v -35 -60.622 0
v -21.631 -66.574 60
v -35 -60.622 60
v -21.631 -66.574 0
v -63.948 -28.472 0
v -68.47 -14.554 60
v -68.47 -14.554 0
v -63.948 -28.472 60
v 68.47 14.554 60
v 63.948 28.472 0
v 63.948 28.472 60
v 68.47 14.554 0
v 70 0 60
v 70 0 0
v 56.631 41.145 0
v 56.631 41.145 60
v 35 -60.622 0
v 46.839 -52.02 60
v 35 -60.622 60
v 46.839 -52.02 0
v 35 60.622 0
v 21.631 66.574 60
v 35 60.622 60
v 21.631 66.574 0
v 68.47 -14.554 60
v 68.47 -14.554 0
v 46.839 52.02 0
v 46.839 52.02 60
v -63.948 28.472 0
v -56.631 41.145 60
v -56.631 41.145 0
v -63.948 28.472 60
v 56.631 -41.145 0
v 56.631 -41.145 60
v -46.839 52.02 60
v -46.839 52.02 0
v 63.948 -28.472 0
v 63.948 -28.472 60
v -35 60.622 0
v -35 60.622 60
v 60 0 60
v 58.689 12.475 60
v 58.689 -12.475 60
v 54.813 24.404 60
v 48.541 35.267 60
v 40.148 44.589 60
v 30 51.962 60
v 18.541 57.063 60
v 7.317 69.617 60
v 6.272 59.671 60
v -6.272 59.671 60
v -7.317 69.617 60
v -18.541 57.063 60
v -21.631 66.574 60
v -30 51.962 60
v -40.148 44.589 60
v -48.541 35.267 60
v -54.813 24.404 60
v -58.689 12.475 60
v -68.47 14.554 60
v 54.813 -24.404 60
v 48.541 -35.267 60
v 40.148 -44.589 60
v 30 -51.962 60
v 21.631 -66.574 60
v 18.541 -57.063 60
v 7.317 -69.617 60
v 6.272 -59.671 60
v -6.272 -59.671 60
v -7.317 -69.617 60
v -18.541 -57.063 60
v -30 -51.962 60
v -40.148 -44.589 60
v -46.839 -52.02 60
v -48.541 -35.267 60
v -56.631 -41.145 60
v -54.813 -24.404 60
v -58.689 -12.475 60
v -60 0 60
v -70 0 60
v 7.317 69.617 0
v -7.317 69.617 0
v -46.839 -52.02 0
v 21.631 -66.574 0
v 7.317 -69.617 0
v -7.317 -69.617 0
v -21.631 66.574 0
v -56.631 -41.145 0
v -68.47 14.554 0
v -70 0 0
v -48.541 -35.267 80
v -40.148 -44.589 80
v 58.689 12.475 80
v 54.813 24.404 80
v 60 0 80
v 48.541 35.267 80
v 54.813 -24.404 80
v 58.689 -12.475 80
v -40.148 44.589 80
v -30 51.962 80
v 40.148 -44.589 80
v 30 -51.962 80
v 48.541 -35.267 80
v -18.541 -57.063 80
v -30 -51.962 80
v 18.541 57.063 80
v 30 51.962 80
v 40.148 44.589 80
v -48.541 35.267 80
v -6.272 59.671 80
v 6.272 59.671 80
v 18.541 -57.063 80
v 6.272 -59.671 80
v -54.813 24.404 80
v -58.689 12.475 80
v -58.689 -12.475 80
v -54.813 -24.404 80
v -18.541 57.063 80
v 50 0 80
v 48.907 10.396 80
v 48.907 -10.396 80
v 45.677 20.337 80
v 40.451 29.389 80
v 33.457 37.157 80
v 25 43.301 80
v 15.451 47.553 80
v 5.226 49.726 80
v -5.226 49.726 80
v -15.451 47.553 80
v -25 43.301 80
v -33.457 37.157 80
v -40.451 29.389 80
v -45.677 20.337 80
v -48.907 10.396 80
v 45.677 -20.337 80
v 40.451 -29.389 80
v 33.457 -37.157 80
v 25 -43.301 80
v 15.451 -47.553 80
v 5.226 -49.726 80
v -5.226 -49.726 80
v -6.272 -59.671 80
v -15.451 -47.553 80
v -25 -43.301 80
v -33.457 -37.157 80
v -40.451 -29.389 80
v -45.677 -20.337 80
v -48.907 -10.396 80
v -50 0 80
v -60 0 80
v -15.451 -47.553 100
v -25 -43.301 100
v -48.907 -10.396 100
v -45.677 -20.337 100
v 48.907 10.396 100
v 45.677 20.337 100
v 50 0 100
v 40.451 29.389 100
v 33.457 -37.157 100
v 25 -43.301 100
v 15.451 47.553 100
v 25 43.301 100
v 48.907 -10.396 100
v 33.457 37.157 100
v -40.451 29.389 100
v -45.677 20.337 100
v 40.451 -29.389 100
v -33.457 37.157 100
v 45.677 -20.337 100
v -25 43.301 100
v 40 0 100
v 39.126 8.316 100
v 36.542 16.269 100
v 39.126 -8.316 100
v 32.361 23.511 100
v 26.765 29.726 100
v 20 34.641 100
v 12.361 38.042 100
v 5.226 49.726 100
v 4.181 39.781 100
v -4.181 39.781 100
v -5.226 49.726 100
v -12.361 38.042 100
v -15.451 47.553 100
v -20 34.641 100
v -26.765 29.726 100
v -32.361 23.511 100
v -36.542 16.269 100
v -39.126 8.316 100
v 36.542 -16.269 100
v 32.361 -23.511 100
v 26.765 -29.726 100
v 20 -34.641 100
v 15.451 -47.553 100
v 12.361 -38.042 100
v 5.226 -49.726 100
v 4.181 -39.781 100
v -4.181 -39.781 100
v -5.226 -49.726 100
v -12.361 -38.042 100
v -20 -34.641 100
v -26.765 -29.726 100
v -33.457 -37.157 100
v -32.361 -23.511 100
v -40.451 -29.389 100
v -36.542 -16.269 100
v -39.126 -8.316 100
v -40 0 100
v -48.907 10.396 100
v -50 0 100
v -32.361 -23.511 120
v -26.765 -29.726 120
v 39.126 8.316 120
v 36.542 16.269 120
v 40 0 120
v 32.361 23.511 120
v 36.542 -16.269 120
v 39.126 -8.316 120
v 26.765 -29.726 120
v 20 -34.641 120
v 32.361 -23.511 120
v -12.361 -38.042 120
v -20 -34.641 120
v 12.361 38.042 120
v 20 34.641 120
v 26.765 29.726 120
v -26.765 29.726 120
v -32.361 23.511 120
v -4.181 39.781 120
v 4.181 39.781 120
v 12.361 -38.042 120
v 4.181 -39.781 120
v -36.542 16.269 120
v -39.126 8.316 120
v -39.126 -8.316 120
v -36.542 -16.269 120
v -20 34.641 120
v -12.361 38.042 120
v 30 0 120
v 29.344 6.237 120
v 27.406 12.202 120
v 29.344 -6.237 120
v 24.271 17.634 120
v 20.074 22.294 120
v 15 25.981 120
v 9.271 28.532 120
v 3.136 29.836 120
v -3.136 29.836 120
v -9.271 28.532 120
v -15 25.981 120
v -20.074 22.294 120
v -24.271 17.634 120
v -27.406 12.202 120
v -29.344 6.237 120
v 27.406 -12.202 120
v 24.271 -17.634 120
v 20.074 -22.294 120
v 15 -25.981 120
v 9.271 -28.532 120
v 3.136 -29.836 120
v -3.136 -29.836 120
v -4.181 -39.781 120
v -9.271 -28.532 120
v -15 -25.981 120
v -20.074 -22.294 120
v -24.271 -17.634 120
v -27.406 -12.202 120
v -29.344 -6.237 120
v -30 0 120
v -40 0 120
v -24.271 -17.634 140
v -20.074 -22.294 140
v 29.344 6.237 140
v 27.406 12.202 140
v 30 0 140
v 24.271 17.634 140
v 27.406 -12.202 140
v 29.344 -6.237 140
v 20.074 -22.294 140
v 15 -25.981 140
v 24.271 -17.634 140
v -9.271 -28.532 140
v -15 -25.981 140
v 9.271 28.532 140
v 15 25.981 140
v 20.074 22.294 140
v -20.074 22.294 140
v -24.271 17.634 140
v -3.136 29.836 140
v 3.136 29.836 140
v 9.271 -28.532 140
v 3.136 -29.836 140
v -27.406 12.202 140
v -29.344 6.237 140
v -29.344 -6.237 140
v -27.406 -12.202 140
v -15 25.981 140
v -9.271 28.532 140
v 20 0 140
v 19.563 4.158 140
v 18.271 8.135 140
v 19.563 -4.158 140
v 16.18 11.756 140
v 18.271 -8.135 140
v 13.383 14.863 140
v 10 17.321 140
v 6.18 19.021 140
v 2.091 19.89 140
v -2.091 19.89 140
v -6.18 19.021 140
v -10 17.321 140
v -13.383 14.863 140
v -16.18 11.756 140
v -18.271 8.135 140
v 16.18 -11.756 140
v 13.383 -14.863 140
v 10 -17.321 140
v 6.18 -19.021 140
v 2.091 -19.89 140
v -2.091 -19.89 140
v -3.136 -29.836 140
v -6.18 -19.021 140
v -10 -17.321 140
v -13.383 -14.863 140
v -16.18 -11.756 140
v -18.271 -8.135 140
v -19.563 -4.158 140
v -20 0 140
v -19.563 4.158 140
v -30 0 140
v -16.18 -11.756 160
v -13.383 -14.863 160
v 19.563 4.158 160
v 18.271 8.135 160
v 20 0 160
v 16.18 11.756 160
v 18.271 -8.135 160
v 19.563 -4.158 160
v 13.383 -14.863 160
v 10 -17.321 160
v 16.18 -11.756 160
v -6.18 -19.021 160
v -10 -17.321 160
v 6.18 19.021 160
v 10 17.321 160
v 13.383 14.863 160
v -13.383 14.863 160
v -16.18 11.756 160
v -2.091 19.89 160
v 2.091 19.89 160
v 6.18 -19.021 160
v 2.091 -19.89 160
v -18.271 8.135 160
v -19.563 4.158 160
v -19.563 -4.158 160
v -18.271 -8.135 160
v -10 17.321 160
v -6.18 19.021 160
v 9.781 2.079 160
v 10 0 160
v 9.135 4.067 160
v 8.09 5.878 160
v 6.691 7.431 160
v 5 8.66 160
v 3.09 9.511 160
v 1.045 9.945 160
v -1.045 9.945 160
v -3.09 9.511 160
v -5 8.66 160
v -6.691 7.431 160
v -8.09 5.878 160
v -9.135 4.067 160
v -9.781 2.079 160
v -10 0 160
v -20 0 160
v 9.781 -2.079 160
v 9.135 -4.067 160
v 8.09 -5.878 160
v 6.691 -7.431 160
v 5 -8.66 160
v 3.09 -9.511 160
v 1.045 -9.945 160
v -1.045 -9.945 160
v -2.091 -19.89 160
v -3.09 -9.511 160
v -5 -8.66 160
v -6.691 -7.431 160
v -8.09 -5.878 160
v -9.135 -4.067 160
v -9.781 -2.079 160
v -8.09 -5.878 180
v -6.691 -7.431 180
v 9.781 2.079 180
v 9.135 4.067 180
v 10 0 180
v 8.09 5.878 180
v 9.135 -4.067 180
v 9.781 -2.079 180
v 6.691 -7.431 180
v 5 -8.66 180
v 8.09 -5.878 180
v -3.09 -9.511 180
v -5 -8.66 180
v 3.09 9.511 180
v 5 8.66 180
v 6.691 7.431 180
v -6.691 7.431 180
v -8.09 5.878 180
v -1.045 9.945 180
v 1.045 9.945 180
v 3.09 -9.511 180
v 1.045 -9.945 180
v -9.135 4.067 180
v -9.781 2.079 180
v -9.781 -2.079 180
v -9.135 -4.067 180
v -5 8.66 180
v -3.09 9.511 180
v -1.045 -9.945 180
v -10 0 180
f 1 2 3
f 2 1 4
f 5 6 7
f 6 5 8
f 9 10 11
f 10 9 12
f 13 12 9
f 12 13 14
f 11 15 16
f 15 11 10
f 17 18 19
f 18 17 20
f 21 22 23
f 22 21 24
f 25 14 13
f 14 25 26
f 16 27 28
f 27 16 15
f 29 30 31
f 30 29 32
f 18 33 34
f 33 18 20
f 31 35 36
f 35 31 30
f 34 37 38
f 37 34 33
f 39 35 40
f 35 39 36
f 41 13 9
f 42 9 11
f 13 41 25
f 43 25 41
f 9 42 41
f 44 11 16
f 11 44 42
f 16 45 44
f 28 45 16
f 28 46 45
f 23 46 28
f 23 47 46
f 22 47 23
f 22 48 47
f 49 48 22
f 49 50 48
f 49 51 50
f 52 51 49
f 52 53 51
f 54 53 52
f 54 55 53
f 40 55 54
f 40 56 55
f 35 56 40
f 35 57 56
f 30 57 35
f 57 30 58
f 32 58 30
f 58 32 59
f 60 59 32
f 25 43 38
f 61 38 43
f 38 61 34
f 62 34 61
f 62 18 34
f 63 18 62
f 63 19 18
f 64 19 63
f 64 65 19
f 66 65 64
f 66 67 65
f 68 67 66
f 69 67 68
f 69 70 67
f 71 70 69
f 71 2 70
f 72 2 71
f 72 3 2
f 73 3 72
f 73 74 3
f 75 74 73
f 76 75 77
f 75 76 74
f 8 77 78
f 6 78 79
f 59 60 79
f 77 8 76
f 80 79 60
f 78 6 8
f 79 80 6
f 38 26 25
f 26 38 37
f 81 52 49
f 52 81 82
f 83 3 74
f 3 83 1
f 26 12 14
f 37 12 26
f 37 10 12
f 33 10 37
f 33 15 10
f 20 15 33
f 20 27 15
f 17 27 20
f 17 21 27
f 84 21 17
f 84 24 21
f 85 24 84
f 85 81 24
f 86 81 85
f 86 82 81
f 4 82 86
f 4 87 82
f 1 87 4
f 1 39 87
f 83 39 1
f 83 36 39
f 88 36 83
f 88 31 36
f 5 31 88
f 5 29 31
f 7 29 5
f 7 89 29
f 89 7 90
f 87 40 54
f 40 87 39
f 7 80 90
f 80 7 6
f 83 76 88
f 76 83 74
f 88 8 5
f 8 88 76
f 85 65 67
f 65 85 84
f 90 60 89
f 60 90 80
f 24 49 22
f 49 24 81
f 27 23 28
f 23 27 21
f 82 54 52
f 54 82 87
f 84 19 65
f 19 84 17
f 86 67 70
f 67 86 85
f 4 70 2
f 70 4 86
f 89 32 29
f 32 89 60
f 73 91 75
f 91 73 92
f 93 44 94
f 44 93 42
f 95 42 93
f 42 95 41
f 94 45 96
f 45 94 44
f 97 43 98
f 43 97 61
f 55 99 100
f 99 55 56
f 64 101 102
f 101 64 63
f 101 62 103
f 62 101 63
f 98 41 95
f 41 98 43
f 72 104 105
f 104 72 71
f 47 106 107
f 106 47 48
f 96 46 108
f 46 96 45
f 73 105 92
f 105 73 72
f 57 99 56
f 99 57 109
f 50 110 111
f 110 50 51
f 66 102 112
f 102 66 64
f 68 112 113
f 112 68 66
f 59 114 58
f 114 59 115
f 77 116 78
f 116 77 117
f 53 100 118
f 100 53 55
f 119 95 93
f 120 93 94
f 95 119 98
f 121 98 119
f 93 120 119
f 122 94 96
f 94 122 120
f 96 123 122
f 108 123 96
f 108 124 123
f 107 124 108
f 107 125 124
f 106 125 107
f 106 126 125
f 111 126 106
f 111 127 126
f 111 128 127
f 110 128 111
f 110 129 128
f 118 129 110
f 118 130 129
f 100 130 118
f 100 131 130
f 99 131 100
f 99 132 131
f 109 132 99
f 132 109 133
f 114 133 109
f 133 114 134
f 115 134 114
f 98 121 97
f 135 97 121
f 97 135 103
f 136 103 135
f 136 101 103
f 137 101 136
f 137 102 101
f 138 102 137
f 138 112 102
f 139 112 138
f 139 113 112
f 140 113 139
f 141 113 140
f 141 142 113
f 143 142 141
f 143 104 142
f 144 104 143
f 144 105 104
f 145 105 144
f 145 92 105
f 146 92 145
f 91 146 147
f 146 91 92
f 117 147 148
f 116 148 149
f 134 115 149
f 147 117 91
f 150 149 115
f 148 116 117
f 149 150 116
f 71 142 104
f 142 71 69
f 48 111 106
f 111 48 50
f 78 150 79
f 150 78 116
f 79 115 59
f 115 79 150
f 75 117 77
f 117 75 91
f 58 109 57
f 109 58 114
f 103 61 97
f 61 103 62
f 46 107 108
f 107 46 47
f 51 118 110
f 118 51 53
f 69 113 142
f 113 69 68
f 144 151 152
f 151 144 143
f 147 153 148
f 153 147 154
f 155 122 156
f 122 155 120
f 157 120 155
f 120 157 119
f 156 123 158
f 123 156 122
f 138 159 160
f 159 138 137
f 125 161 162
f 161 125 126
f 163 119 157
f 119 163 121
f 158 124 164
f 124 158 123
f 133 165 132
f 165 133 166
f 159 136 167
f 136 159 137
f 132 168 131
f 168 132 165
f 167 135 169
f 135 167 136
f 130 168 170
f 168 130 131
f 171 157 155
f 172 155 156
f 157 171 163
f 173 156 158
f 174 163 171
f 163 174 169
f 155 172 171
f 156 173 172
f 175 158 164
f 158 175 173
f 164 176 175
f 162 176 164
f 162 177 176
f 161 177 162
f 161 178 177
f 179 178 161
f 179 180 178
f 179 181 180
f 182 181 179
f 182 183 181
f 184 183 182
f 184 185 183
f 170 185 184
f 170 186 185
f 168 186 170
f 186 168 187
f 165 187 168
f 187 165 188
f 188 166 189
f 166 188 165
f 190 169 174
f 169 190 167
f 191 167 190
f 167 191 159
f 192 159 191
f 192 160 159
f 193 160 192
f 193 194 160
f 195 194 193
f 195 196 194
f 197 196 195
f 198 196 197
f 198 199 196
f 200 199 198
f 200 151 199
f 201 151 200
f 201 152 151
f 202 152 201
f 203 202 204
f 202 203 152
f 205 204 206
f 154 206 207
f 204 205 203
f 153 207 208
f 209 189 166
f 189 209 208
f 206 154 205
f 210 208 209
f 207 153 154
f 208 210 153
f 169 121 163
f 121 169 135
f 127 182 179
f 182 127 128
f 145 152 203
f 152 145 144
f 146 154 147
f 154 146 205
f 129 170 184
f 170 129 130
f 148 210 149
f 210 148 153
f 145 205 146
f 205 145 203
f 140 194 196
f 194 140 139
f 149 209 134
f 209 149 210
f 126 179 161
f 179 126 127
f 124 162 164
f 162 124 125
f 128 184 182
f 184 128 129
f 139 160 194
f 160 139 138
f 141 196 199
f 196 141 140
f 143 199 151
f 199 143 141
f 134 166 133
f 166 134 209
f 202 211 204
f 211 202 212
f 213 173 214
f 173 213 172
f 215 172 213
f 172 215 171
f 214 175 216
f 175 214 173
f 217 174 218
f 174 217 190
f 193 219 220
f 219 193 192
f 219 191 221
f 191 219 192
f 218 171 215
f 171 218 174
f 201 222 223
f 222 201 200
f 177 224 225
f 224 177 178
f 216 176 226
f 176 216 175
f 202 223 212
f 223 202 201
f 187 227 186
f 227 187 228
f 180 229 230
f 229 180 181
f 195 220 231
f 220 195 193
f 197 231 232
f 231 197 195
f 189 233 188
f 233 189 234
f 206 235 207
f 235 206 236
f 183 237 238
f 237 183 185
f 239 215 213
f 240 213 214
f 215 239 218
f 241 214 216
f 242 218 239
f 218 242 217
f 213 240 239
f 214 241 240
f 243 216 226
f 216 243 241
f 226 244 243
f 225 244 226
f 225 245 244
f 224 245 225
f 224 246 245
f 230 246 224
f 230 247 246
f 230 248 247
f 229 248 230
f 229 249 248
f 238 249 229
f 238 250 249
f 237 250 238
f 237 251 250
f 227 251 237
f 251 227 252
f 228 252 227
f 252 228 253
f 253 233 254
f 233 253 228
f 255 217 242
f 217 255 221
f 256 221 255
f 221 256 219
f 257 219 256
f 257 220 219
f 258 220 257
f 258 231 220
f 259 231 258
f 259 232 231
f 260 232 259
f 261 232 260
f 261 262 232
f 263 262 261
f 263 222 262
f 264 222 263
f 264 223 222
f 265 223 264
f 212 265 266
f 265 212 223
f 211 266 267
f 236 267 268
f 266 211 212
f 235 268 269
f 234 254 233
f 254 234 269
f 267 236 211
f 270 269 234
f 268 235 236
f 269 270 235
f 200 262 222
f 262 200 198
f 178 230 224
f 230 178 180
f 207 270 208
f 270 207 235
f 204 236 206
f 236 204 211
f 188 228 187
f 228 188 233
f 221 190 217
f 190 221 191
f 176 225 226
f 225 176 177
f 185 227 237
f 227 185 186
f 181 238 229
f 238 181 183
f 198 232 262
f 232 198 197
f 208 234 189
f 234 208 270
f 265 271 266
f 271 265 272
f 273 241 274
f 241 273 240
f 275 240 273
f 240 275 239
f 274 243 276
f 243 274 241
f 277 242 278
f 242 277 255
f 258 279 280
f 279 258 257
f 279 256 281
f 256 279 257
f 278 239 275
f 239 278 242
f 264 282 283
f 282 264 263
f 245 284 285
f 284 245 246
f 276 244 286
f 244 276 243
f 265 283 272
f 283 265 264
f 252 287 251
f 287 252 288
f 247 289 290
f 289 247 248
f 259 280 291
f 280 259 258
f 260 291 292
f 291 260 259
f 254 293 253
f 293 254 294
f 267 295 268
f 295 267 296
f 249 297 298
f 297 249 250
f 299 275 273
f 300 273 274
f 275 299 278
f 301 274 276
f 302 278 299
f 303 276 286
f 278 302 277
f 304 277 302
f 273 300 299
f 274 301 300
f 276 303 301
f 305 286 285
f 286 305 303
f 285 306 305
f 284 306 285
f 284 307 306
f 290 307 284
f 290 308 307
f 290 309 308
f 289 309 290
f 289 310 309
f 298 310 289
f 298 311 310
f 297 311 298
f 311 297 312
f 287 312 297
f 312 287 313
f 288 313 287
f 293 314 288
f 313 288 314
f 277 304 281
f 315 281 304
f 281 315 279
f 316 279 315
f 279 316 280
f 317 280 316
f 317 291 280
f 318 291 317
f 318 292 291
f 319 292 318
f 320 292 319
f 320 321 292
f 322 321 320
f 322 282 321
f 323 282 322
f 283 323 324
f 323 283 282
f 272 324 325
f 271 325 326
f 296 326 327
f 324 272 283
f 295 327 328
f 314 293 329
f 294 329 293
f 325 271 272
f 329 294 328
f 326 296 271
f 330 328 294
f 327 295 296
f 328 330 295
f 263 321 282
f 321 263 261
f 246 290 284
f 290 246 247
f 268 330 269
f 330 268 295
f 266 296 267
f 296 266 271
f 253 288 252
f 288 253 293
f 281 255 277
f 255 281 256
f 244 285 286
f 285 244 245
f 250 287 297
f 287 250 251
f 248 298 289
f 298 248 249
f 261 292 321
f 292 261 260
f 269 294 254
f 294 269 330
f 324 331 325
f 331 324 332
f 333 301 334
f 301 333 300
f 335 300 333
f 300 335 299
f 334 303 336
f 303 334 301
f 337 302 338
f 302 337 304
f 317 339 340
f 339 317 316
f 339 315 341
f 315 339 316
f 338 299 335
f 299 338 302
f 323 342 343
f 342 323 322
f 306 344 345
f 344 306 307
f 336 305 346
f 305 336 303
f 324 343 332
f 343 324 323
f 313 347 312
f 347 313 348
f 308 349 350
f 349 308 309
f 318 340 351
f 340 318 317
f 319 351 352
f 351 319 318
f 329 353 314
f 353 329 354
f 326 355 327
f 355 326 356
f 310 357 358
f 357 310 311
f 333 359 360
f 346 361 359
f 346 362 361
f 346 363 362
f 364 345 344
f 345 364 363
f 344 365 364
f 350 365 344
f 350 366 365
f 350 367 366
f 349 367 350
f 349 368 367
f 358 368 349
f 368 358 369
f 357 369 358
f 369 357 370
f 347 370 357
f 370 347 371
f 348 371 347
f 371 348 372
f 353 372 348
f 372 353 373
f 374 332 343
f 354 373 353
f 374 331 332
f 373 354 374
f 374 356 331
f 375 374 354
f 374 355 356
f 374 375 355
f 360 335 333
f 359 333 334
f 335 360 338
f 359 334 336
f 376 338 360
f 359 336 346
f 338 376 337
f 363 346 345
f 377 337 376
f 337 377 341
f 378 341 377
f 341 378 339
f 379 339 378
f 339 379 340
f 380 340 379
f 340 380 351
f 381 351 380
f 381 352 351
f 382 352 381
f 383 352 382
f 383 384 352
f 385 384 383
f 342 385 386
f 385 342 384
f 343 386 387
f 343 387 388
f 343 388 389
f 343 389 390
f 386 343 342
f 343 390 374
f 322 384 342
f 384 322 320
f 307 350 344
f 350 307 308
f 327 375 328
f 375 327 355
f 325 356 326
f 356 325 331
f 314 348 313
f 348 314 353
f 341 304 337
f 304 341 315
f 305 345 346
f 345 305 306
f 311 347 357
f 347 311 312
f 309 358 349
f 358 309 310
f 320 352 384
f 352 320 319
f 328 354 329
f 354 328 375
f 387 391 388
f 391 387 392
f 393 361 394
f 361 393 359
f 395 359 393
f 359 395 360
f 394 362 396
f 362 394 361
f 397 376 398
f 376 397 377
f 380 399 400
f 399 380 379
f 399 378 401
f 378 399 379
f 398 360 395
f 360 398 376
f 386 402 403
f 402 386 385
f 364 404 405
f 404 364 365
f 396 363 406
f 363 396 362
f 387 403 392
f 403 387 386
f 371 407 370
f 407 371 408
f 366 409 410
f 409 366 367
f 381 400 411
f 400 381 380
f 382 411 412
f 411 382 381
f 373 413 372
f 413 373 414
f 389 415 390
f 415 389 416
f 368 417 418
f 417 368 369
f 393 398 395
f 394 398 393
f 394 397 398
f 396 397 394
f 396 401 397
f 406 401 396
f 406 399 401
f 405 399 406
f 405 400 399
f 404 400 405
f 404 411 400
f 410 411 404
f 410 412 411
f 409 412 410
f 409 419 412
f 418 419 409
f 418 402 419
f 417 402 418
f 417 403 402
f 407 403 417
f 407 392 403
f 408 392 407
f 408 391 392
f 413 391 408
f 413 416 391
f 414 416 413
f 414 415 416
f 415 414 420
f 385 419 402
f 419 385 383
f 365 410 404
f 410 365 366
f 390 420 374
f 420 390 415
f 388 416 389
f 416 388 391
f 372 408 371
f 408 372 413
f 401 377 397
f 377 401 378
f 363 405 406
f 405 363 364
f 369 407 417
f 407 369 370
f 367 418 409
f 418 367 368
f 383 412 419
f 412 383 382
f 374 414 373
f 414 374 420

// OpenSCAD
for(radius = [70: -10: 10])
{
    cylinder(h = 2*(100-radius), r = radius);
}
